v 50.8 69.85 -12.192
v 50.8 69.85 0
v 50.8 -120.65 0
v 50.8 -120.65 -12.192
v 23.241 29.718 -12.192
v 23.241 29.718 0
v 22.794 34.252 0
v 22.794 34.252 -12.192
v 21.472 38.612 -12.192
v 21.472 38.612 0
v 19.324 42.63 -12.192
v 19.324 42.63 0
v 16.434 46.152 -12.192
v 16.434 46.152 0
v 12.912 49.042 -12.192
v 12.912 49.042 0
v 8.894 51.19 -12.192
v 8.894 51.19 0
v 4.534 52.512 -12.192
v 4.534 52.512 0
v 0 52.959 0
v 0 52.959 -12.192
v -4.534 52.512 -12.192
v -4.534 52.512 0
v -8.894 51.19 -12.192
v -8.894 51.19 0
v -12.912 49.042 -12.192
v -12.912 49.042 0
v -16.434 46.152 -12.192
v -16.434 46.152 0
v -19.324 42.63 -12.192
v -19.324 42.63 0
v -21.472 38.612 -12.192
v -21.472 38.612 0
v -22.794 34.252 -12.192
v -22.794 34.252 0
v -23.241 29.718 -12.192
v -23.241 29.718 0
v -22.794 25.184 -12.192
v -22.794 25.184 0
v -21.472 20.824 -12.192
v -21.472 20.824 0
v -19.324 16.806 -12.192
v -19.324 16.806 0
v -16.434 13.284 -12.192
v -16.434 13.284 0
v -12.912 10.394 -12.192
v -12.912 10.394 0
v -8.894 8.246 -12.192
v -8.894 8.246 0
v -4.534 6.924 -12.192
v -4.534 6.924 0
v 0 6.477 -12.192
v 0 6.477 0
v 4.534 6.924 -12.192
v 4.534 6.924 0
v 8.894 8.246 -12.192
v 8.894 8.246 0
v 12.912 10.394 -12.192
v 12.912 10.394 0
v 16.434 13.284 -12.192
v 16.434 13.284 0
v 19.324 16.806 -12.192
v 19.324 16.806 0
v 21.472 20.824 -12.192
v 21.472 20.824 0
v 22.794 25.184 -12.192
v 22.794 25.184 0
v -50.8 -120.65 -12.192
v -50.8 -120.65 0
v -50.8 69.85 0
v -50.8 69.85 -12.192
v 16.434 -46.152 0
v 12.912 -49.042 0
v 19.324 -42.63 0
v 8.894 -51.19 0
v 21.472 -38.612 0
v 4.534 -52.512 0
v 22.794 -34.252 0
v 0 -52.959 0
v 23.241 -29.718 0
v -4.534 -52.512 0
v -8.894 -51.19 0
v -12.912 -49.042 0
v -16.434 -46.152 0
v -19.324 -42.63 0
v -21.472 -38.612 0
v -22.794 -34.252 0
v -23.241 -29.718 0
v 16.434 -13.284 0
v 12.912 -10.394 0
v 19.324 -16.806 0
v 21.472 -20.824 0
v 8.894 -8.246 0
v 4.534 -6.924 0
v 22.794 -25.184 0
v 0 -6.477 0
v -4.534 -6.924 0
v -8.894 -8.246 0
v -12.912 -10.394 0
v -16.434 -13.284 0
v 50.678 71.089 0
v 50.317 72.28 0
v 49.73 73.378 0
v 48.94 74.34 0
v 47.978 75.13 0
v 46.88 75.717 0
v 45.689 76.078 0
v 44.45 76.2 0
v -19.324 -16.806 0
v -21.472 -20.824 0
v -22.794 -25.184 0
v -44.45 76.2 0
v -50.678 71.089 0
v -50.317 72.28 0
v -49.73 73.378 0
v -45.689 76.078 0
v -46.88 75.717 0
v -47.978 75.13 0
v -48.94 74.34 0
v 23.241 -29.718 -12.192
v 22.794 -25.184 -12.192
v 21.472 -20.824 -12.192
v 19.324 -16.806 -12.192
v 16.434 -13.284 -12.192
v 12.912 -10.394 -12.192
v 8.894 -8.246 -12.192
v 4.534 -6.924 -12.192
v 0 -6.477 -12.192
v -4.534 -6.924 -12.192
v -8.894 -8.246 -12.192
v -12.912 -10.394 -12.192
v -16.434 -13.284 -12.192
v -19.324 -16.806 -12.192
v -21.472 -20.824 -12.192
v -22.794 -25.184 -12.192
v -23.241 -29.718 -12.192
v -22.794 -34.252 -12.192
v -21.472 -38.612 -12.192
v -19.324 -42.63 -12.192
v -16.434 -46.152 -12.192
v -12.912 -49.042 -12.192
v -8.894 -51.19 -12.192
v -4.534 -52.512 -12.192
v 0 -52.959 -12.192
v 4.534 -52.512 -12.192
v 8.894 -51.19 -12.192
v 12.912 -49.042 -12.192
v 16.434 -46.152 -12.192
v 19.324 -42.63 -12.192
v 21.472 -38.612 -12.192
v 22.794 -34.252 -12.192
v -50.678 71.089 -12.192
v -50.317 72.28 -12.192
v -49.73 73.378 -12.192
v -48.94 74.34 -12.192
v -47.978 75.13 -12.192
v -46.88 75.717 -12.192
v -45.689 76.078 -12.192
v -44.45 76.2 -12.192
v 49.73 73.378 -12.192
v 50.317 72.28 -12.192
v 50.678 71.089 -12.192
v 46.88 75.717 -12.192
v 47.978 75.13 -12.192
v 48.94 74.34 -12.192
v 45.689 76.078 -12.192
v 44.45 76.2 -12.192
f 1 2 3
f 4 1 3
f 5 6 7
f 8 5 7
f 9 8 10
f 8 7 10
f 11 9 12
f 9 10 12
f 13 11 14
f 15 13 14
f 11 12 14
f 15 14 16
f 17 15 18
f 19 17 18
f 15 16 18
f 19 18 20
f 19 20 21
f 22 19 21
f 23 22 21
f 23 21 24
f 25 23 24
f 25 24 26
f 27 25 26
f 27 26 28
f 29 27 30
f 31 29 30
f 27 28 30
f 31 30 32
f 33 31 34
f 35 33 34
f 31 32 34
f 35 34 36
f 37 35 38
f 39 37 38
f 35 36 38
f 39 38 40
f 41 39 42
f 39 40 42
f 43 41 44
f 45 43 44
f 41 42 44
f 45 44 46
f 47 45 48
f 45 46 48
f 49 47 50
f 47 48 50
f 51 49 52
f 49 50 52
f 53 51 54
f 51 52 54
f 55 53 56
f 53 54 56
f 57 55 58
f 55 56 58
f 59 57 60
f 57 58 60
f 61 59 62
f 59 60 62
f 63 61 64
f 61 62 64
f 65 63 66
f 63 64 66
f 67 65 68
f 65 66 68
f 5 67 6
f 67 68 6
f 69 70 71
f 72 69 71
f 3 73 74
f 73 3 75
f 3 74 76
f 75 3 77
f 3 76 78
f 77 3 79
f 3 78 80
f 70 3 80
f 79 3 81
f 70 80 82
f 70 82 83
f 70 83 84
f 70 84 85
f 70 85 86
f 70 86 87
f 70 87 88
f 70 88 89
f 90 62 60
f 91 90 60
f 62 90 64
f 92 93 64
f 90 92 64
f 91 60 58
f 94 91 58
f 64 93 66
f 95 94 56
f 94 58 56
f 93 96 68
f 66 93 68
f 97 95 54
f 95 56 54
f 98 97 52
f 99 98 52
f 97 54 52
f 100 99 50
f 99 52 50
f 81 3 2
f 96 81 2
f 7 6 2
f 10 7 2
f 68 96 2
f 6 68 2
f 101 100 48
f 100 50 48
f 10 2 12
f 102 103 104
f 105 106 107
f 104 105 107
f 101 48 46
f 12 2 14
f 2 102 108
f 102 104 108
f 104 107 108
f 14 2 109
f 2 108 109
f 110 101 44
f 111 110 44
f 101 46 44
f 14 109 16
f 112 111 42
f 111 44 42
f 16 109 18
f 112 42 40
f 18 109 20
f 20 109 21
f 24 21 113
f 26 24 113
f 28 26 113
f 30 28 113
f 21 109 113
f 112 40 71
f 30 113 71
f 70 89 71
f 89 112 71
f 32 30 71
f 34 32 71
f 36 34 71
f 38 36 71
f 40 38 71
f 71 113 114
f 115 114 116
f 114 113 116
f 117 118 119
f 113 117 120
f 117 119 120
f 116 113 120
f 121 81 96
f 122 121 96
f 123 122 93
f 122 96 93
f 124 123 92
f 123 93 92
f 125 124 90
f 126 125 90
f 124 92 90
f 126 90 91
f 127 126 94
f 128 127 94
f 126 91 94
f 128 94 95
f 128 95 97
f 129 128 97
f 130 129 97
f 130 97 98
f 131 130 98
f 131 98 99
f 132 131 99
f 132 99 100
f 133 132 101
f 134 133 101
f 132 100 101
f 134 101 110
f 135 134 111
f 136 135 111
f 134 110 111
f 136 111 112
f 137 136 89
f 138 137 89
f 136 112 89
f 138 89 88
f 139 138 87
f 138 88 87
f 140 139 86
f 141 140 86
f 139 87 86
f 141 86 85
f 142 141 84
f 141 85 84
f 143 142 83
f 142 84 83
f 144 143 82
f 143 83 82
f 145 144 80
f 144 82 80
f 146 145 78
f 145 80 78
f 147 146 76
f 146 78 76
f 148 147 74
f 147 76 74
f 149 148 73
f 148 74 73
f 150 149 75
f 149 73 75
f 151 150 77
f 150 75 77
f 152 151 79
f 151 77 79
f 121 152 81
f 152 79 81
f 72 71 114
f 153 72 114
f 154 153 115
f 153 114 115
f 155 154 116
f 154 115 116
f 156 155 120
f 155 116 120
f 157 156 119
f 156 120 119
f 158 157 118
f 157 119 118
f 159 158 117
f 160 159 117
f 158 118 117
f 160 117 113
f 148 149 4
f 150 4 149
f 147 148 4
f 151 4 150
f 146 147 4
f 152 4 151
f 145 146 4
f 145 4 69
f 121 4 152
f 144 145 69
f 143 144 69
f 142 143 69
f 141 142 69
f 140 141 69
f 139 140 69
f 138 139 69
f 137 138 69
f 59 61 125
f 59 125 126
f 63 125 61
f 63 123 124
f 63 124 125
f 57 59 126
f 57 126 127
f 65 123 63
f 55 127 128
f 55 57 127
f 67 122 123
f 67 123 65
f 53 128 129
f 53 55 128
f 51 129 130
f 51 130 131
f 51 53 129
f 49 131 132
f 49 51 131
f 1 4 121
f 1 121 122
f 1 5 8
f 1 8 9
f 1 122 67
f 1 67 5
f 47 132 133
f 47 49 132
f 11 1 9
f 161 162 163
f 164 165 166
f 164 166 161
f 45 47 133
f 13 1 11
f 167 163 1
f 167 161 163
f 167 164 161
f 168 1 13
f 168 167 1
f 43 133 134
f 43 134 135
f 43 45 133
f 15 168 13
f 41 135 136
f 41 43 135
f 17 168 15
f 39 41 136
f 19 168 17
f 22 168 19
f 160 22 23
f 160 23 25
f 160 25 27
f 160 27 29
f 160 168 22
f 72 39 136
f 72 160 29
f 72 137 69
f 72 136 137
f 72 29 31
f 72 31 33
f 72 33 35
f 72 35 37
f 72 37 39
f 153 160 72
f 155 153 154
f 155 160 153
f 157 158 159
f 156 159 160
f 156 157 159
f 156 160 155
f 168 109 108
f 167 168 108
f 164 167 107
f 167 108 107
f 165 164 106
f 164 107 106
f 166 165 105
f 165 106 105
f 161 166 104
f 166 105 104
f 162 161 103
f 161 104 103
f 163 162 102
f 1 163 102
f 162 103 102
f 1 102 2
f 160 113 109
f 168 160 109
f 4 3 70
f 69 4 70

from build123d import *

# Parameters (mm, degrees)
SKETCH1_R           = 23.241
BOSS_EXTRUDE1_DEPTH = 12.192


with BuildPart() as part:
    # Sketch1 → Boss-Extrude1 (new body)
    with BuildSketch(Plane.XY):
        with BuildLine():
            Line((-44.45, 76.2), (44.45, 76.2))
            ThreePointArc((44.45, 76.2), (48.940128061, 74.340128061), (50.8, 69.85))
            Line((50.8, 69.85), (50.8, -69.85))
            Line((50.8, -69.85), (50.8, -120.65))
            Line((50.8, -120.65), (-50.8, -120.65))
            Line((-50.8, -120.65), (-50.8, -69.85))
            Line((-50.8, -69.85), (-50.8, 69.85))
            ThreePointArc((-50.8, 69.85), (-48.940128061, 74.340128061), (-44.45, 76.2))
        make_face()
        with Locations((0, 29.718)):
            Circle(SKETCH1_R, mode=Mode.SUBTRACT)
        with Locations((0, -29.718)):
            Circle(SKETCH1_R, mode=Mode.SUBTRACT)
    extrude(amount=-BOSS_EXTRUDE1_DEPTH)


solid = part.part
